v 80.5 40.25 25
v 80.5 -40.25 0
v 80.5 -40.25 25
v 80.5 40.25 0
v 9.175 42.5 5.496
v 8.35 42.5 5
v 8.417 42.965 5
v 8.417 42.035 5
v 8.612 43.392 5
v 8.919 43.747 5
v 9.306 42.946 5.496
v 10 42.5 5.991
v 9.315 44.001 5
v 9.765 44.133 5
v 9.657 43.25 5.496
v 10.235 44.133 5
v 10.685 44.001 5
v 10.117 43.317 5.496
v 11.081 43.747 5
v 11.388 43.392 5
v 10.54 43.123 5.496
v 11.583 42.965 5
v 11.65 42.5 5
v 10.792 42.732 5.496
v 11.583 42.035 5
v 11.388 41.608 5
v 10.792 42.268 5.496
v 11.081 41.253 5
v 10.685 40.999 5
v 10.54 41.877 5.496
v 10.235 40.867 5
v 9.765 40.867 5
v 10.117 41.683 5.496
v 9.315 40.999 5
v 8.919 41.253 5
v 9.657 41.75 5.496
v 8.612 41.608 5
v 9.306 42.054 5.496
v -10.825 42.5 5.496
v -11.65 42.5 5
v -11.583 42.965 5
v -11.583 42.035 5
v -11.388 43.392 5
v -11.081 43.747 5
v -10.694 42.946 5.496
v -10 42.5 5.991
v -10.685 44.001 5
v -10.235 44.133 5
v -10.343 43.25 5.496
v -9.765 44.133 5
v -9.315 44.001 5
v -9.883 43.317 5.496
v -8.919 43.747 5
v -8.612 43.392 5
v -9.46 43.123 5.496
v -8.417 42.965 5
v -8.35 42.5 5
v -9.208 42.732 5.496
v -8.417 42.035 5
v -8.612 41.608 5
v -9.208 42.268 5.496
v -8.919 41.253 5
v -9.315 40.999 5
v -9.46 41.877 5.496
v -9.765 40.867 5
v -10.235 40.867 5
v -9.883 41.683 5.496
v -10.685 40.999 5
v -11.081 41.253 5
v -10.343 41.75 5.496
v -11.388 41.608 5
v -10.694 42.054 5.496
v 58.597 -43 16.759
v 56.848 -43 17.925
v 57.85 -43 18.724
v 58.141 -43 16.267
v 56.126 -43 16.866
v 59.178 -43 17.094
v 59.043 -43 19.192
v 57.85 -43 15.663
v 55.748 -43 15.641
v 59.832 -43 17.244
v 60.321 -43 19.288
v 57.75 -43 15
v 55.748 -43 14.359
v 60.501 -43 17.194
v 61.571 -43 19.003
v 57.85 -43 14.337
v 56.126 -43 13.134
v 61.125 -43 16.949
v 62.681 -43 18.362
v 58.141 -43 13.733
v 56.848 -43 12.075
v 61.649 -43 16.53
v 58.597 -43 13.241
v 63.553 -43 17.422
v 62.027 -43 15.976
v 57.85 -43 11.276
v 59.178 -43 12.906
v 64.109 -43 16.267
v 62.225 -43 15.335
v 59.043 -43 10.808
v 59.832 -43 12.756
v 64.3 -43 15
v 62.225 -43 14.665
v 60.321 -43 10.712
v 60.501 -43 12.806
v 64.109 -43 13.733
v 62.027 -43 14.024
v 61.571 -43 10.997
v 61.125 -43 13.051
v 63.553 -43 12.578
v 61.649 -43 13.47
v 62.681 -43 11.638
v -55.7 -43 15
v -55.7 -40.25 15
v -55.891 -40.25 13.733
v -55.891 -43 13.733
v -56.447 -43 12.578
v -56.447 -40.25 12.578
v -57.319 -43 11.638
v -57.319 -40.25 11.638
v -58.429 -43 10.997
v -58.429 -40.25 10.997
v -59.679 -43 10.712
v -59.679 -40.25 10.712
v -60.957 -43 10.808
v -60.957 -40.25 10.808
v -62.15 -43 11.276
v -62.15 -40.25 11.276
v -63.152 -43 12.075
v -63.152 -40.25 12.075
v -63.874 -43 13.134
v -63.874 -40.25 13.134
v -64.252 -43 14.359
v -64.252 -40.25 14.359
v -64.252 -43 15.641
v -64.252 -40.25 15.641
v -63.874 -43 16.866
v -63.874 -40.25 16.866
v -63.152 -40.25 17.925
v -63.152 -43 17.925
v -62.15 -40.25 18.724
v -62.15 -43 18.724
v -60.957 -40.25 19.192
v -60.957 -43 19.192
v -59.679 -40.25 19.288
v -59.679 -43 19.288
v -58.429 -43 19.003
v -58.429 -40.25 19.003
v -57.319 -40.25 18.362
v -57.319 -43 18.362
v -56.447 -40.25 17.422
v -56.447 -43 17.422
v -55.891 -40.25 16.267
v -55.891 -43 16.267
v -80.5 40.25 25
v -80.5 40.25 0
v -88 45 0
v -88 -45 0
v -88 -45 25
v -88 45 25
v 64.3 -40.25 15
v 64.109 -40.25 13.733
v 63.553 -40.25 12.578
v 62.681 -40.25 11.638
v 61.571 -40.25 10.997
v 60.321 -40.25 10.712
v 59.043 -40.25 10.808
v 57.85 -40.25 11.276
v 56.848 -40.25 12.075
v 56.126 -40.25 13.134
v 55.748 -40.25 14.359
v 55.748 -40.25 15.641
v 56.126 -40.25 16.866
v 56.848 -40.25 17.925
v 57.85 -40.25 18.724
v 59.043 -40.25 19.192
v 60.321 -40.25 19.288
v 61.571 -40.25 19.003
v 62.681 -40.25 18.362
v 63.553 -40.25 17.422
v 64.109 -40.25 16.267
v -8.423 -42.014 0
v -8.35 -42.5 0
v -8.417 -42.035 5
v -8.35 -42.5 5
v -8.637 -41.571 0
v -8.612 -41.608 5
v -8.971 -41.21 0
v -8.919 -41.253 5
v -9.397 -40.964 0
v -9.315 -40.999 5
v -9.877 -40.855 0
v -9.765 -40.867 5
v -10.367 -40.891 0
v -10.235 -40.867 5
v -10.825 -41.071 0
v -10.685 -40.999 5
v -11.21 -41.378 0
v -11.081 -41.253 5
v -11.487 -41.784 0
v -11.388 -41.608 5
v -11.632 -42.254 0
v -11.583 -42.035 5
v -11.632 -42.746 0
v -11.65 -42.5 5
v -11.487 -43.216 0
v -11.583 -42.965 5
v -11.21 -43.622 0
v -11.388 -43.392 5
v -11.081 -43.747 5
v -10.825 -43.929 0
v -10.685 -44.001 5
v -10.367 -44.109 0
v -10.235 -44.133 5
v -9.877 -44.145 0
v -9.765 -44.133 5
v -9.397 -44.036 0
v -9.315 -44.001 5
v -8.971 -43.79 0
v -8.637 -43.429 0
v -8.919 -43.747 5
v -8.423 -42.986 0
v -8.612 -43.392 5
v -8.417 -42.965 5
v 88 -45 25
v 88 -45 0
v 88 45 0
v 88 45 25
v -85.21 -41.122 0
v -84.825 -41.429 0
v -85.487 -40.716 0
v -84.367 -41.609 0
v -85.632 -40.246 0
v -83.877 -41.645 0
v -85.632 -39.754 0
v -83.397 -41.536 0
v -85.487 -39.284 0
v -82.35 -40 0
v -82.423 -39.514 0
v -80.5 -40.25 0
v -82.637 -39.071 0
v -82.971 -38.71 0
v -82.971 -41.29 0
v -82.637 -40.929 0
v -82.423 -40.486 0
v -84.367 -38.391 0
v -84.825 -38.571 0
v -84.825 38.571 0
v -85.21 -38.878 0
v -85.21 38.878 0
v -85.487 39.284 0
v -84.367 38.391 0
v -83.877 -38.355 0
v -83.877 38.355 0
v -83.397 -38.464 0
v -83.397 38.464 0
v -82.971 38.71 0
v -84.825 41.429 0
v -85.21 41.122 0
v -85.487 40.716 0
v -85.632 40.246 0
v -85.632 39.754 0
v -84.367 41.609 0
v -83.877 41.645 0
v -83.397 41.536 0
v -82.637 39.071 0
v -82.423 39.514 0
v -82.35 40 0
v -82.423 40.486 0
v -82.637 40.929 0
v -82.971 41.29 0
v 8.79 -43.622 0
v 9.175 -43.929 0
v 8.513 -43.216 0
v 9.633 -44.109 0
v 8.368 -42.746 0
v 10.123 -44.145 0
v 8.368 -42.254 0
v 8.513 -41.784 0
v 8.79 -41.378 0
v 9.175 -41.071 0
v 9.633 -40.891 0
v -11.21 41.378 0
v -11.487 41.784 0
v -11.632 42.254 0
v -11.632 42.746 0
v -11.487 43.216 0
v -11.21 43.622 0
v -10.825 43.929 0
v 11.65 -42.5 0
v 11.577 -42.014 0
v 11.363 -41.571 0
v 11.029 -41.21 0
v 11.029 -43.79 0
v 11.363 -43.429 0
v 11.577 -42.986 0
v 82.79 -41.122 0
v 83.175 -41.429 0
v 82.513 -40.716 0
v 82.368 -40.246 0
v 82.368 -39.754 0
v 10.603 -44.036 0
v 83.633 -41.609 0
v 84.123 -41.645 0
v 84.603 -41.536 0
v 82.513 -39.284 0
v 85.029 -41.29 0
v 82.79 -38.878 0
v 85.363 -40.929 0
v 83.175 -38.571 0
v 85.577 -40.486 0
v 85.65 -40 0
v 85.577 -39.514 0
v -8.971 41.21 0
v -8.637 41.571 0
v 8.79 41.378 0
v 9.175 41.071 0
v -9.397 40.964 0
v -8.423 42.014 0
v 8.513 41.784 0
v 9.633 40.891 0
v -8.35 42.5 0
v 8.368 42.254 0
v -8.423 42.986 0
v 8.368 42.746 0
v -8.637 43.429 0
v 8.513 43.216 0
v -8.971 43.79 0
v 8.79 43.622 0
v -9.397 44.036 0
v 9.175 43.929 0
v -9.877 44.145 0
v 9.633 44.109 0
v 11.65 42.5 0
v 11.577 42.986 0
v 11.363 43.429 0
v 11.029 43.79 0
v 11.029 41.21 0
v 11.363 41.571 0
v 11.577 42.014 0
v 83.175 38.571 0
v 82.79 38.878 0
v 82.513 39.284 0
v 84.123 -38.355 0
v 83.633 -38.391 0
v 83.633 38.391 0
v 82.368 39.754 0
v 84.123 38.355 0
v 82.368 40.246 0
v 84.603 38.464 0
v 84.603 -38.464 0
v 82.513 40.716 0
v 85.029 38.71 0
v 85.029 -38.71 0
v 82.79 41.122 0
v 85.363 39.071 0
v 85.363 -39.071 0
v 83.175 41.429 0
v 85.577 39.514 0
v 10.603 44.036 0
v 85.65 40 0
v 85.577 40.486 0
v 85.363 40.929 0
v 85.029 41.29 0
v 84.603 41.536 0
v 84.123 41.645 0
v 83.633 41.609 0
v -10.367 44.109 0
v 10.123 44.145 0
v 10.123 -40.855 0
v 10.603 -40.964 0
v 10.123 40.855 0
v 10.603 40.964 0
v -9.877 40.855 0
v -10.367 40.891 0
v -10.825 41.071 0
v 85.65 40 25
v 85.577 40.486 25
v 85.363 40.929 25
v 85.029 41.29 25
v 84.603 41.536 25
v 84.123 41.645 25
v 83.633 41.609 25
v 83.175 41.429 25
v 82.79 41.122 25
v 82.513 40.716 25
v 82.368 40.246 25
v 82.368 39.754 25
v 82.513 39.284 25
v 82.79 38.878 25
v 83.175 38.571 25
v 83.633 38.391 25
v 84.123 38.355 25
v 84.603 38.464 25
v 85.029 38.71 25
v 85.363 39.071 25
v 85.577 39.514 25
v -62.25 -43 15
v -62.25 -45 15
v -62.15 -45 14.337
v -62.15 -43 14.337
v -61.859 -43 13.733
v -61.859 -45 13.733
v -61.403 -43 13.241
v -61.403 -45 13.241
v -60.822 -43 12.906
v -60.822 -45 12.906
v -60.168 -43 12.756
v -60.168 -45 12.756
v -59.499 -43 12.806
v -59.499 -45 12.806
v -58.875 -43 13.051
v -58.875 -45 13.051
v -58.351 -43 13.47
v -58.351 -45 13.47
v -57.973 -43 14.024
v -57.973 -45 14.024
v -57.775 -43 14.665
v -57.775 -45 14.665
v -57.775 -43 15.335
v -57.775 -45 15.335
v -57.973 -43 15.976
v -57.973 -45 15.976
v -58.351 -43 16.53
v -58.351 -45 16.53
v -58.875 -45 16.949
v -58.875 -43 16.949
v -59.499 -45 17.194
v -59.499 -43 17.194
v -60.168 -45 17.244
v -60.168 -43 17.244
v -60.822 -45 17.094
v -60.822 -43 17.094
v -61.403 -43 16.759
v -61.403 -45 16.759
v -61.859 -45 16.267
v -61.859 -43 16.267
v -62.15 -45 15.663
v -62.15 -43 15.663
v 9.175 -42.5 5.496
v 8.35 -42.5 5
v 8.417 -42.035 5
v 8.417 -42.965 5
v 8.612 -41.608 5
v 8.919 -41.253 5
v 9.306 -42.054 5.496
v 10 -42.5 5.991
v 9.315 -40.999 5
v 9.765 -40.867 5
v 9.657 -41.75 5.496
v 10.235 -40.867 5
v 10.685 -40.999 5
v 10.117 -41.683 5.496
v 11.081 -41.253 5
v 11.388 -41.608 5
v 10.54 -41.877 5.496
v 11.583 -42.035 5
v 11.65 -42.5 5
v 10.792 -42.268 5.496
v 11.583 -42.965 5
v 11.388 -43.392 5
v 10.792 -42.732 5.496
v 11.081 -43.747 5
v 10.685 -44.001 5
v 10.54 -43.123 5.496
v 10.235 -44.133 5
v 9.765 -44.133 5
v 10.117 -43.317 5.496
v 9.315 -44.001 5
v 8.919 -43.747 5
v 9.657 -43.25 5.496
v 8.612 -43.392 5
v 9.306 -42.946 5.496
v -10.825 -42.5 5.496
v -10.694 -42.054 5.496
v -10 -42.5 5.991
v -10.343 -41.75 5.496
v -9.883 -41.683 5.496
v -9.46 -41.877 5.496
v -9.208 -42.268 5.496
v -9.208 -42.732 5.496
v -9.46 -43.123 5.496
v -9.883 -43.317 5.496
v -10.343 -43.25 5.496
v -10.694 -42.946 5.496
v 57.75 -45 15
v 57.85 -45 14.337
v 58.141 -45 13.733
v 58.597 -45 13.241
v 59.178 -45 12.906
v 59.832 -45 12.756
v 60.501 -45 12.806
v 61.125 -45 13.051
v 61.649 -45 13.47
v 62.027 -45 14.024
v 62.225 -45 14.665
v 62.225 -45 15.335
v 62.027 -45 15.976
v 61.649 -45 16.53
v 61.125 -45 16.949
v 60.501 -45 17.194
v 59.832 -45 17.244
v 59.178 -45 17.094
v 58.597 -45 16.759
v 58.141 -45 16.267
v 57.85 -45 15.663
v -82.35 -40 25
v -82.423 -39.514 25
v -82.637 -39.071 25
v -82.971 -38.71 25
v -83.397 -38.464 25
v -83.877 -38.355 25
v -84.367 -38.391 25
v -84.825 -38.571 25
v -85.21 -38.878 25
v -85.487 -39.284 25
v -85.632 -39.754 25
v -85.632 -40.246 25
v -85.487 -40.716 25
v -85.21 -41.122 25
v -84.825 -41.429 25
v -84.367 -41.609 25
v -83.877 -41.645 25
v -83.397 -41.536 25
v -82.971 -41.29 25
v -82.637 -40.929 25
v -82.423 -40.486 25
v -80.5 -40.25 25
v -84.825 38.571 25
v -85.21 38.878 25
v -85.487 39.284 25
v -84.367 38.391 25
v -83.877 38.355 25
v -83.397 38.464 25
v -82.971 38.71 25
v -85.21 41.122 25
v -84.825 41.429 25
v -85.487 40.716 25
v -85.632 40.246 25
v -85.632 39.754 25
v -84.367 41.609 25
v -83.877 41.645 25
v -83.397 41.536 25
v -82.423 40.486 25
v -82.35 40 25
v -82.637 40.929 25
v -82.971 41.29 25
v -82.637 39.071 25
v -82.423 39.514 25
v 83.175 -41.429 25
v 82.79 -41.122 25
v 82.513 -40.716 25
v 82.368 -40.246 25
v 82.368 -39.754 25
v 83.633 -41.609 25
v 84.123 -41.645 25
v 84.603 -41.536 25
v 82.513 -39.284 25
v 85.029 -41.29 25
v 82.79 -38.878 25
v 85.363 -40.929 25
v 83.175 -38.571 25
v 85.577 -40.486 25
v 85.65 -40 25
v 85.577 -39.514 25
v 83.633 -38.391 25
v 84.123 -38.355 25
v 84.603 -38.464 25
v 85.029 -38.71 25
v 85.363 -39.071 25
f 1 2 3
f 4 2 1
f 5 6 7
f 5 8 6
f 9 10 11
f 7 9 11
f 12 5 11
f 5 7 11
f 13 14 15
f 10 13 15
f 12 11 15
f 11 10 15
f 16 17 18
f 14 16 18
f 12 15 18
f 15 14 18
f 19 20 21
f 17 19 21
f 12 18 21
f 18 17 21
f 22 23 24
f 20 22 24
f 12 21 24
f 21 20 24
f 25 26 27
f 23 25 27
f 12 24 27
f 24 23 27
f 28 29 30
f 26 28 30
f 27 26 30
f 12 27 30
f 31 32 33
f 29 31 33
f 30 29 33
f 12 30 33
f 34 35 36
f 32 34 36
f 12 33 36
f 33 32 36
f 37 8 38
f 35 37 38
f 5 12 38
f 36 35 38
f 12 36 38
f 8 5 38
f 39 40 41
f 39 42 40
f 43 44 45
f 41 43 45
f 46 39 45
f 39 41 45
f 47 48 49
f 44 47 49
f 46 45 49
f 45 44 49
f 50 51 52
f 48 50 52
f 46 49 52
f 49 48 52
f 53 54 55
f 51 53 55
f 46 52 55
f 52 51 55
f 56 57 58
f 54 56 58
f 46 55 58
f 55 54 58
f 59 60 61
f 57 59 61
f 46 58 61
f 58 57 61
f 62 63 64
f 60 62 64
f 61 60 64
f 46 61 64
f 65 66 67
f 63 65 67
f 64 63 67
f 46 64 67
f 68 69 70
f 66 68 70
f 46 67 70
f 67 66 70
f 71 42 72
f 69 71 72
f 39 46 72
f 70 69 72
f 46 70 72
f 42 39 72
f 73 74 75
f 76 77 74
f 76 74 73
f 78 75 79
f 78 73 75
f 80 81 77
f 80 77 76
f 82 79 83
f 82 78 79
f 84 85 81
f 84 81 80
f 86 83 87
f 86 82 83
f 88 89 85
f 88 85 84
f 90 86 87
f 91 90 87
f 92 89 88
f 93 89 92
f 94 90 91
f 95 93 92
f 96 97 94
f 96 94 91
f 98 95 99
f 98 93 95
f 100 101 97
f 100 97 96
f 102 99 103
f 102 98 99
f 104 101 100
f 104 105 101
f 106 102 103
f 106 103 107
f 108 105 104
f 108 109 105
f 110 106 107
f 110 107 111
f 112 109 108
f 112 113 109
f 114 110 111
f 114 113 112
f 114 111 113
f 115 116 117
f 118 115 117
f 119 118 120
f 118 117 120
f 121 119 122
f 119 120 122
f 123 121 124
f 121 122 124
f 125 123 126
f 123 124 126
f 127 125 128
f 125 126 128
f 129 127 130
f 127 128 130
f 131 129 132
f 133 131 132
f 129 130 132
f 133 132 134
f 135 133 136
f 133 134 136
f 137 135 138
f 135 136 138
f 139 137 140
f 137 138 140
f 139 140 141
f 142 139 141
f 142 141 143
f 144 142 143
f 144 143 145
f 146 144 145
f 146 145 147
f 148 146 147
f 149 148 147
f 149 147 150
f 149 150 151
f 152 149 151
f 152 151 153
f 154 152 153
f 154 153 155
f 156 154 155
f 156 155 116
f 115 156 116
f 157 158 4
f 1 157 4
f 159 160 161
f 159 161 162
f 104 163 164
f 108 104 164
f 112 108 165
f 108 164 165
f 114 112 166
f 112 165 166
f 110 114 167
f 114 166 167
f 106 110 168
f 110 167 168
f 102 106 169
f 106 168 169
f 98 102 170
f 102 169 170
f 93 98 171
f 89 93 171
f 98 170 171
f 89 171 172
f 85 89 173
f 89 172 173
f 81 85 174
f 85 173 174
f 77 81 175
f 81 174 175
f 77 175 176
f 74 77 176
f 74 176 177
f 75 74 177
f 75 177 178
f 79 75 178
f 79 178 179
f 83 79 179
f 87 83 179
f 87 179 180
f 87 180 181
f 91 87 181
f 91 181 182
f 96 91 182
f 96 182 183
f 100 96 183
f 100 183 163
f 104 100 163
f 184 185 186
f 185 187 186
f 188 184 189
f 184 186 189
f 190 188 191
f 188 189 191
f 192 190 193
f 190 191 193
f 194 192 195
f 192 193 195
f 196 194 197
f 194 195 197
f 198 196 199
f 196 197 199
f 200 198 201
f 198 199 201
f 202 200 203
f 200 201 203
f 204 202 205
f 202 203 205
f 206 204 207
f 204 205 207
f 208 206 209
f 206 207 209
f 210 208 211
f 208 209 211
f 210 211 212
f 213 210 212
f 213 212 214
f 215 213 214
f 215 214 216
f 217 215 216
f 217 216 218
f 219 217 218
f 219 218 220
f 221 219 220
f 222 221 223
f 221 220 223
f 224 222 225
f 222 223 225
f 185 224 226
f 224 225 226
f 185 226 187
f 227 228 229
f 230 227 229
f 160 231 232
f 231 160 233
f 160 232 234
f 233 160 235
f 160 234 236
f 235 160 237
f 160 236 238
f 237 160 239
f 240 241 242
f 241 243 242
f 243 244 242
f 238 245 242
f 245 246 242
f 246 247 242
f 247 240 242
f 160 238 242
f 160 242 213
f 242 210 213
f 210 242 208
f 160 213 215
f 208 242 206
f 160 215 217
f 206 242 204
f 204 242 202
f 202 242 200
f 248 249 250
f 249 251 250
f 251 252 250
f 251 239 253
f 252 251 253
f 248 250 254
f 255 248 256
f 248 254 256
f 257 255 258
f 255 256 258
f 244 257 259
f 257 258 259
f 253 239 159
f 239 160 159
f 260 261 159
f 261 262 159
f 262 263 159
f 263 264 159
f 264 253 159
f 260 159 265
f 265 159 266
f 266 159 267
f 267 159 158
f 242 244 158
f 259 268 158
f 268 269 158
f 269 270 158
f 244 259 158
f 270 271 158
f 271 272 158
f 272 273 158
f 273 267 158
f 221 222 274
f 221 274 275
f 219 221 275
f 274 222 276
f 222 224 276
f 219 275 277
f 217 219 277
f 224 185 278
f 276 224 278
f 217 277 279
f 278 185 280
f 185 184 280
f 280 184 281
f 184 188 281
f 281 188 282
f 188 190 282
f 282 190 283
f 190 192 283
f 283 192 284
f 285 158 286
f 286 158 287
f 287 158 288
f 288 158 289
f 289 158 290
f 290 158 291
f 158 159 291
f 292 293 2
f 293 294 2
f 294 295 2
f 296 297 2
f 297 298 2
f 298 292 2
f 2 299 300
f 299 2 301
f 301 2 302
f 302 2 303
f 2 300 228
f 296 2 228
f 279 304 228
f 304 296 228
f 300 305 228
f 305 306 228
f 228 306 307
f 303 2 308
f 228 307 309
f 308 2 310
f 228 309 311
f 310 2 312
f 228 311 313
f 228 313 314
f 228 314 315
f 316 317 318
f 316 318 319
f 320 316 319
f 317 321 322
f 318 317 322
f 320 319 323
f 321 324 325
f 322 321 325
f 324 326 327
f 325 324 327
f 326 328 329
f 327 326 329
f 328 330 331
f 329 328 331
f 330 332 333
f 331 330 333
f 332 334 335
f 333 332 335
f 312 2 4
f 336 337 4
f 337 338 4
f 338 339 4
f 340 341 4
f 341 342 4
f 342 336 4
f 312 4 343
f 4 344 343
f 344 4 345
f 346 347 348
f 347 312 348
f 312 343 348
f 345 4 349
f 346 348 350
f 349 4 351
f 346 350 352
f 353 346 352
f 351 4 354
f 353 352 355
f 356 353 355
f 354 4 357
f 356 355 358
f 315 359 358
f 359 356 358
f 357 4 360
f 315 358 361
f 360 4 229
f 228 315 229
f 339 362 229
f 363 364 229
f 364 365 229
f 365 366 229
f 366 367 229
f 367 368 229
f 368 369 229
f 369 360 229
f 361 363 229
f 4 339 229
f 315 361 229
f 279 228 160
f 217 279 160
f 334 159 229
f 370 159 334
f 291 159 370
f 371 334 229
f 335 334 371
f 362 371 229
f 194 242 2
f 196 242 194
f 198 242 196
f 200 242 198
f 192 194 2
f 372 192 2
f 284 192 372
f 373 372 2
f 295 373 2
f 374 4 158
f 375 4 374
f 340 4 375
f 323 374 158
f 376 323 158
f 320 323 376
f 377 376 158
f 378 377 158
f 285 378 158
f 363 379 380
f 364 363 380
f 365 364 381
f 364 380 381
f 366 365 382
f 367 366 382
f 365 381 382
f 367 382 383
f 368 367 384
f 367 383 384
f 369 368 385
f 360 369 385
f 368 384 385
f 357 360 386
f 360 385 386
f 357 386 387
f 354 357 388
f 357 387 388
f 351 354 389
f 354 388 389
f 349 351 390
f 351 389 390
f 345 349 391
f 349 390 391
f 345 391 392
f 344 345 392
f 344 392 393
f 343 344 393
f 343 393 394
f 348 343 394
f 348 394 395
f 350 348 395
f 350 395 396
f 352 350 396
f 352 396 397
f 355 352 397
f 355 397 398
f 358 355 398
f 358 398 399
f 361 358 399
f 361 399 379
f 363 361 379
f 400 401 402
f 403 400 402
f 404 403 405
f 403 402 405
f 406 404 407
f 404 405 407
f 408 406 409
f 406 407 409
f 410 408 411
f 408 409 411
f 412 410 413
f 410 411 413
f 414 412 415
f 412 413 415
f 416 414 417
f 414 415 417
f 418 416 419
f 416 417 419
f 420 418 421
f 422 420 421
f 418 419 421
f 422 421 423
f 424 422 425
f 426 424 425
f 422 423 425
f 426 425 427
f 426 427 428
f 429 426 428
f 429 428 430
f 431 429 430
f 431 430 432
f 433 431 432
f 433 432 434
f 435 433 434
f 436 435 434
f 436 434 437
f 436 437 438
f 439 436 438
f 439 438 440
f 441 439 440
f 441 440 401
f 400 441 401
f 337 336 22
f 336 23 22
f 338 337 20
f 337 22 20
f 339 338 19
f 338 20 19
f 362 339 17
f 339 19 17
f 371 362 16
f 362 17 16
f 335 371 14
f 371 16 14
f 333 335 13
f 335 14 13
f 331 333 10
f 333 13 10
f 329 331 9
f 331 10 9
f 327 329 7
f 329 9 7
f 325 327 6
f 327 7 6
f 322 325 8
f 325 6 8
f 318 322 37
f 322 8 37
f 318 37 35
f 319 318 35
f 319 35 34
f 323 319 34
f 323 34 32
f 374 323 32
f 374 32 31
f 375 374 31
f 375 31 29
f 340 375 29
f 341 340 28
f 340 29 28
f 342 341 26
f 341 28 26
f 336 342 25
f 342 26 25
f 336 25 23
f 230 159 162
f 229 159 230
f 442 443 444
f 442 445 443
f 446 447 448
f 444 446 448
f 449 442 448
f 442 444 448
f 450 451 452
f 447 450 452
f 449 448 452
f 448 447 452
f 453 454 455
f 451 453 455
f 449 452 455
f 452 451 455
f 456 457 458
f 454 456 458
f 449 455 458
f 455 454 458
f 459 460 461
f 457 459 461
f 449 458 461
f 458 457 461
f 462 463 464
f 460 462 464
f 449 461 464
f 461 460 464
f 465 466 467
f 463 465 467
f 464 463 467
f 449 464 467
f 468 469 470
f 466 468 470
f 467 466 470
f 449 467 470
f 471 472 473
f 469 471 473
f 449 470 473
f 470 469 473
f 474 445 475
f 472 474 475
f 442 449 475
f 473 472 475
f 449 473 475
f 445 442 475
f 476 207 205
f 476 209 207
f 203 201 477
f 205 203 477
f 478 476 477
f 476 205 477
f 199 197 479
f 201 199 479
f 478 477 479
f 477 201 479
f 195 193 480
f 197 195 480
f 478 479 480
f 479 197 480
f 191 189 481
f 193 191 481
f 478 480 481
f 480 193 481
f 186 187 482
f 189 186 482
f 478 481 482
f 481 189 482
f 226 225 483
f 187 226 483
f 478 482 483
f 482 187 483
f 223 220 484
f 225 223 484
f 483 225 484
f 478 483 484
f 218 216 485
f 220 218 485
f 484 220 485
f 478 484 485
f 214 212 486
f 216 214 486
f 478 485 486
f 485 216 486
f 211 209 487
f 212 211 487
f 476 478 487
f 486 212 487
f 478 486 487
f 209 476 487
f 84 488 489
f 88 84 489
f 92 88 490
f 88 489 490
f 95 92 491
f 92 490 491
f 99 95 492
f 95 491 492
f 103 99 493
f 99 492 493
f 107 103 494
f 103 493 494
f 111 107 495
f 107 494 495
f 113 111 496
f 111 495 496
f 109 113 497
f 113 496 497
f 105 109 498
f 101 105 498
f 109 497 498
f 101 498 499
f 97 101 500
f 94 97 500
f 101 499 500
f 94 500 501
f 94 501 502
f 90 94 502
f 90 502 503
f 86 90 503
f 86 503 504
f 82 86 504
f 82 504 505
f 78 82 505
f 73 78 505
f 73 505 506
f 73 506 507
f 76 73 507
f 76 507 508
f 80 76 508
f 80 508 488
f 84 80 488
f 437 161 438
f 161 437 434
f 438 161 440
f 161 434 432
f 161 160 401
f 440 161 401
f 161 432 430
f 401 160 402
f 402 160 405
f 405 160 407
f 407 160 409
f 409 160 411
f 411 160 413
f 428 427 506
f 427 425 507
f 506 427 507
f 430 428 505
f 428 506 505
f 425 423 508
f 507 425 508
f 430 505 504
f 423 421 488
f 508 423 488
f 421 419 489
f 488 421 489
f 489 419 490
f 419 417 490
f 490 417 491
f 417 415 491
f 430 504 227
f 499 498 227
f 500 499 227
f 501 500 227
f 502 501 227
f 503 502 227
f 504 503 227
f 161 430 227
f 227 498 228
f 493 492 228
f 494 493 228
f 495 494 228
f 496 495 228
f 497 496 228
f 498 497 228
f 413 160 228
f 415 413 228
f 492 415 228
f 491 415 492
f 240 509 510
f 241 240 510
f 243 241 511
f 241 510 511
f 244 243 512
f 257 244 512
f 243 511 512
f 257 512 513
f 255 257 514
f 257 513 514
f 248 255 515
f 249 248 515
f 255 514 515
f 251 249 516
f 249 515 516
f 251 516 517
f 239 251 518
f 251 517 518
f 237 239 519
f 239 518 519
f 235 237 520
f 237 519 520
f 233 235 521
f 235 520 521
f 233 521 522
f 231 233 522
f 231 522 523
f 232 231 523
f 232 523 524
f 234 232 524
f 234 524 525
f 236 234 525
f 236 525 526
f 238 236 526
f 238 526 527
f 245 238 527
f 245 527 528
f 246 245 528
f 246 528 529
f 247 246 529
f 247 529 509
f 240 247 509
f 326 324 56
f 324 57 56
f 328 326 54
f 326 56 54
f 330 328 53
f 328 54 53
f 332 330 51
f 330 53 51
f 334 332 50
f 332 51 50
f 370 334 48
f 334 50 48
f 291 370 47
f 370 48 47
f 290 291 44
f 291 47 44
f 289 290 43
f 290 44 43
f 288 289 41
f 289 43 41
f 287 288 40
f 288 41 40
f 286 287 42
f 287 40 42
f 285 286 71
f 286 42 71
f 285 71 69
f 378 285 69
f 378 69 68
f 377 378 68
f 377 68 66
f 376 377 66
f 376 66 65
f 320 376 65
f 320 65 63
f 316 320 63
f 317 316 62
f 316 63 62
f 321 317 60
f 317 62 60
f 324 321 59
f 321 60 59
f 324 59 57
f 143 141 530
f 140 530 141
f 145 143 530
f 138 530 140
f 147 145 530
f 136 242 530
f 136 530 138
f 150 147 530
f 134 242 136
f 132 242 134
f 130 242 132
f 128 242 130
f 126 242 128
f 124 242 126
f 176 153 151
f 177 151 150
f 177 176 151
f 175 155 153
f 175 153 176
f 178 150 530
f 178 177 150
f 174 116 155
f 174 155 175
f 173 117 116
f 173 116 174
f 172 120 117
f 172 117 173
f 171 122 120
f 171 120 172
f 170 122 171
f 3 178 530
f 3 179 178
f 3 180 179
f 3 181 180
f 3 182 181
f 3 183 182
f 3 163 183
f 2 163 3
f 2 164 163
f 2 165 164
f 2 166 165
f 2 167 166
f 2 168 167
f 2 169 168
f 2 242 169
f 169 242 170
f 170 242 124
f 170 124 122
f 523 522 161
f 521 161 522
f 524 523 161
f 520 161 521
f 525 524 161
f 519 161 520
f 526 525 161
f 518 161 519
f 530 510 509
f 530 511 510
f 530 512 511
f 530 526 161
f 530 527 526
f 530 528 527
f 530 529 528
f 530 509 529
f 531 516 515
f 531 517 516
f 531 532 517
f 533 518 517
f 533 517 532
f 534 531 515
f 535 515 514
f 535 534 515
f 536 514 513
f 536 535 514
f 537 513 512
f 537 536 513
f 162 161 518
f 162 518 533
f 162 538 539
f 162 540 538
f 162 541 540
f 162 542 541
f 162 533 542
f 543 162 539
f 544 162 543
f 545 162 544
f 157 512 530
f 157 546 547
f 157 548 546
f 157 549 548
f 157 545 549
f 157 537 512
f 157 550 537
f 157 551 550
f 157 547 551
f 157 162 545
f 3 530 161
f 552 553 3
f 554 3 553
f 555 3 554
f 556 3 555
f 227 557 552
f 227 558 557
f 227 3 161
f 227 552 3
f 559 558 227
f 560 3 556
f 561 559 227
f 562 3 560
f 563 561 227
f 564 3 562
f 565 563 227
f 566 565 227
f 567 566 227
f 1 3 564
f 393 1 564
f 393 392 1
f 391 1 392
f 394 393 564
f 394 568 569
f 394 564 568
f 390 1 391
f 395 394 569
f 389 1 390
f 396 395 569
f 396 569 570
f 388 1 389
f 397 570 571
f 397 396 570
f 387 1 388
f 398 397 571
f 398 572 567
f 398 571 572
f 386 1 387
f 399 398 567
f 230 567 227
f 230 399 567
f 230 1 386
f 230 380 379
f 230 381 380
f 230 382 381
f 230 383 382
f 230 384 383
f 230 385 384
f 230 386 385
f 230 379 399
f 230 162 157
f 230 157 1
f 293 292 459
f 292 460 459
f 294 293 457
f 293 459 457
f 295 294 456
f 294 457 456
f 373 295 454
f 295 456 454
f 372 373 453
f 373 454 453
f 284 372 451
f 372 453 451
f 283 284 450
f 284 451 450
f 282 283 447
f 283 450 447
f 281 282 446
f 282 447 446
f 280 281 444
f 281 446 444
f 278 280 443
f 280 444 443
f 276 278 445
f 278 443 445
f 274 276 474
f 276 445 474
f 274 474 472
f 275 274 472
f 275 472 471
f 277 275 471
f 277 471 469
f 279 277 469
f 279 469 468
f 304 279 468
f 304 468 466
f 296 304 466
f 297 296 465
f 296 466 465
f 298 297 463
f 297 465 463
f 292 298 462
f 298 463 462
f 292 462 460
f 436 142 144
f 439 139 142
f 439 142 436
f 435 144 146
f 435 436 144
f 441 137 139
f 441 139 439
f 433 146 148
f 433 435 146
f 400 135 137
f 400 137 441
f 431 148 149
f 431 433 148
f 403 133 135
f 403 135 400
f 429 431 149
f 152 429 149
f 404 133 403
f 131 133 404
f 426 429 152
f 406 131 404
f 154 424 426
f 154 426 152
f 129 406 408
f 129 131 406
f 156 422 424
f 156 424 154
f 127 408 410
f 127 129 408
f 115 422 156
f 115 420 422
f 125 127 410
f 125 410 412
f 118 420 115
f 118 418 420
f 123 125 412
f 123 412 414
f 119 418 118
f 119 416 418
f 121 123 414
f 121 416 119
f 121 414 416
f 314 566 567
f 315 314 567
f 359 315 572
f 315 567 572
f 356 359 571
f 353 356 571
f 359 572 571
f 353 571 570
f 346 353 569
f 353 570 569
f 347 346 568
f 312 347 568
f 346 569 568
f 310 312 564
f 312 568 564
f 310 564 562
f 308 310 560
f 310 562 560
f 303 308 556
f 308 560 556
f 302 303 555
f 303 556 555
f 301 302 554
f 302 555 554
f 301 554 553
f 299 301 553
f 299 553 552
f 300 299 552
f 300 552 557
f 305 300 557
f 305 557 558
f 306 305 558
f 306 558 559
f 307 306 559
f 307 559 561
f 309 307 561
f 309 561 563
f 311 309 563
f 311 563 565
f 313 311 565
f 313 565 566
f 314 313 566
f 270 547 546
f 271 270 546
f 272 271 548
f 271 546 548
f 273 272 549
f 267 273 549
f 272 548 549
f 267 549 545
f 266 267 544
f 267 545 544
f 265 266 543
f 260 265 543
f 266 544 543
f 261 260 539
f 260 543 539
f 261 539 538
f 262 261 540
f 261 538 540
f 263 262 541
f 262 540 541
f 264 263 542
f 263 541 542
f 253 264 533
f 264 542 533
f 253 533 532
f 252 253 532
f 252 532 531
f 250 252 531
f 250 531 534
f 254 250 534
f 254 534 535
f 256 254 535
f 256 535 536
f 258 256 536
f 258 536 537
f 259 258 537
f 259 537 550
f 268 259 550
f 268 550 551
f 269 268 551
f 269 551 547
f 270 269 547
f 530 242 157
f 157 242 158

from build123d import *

# Parameters (mm, degrees)
SKETCH5_W                       = 176
SKETCH5_H                       = 90
SKETCH5_W_2                     = 161
SKETCH5_H_2                     = 80.5
BOSS_EXTRUDE2_DEPTH             = 25
M4X0_7_TAPPED_HOLE1_D           = 3.3
CBORE_FOR_M4_SBHCS1_D           = 4.5
CBORE_FOR_M4_SBHCS1_DEPTH       = 4.75
CBORE_FOR_M4_SBHCS1_CBORE_D     = 8.6
CBORE_FOR_M4_SBHCS1_CBORE_DEPTH = 2.75
M4X0_7_TAPPED_HOLE2_D           = 3.3
M4X0_7_TAPPED_HOLE2_DEPTH       = 5
M4X0_7_TAPPED_HOLE2_TIP         = 0.991420021


with BuildPart() as part:
    # Sketch5 → Boss-Extrude2 (new body)
    with BuildSketch(Plane.XY):
        Rectangle(SKETCH5_W, SKETCH5_H)
        Rectangle(SKETCH5_W_2, SKETCH5_H_2, mode=Mode.SUBTRACT)
    extrude(amount=BOSS_EXTRUDE2_DEPTH)

    # M4x0.7 Tapped Hole1 (through all)
    with Locations(Plane(origin=(0, 0, 0), x_dir=(-1, 0, 0), z_dir=(0, 0, -1))):
        with Locations((0, 0), (84, 40), (-84, -40), (-84, 40), (84, -40)):
            Hole(M4X0_7_TAPPED_HOLE1_D / 2)

    # CBORE for M4 SBHCS1
    with Locations(Plane(origin=(0, -40.25, 0), x_dir=(1, 0, 0), z_dir=(0, 1, 0))):
        with Locations((-60, -15), (60, -15)):
            CounterBoreHole(CBORE_FOR_M4_SBHCS1_D / 2, CBORE_FOR_M4_SBHCS1_CBORE_D / 2, CBORE_FOR_M4_SBHCS1_CBORE_DEPTH, depth=CBORE_FOR_M4_SBHCS1_DEPTH)

    # M4x0.7 Tapped Hole2
    with Locations(Plane(origin=(0, 0, 0), x_dir=(-1, 0, 0), z_dir=(0, 0, -1))):
        with Locations((0, 0), (10, 42.5), (-10, -42.5), (-10, 42.5), (10, -42.5)):
            Hole(M4X0_7_TAPPED_HOLE2_D / 2, depth=M4X0_7_TAPPED_HOLE2_DEPTH)
            with Locations((0, 0, -(M4X0_7_TAPPED_HOLE2_DEPTH + M4X0_7_TAPPED_HOLE2_TIP / 2))):  # 118° drill point
                Cone(0, M4X0_7_TAPPED_HOLE2_D / 2, M4X0_7_TAPPED_HOLE2_TIP, mode=Mode.SUBTRACT)


solid = part.part
